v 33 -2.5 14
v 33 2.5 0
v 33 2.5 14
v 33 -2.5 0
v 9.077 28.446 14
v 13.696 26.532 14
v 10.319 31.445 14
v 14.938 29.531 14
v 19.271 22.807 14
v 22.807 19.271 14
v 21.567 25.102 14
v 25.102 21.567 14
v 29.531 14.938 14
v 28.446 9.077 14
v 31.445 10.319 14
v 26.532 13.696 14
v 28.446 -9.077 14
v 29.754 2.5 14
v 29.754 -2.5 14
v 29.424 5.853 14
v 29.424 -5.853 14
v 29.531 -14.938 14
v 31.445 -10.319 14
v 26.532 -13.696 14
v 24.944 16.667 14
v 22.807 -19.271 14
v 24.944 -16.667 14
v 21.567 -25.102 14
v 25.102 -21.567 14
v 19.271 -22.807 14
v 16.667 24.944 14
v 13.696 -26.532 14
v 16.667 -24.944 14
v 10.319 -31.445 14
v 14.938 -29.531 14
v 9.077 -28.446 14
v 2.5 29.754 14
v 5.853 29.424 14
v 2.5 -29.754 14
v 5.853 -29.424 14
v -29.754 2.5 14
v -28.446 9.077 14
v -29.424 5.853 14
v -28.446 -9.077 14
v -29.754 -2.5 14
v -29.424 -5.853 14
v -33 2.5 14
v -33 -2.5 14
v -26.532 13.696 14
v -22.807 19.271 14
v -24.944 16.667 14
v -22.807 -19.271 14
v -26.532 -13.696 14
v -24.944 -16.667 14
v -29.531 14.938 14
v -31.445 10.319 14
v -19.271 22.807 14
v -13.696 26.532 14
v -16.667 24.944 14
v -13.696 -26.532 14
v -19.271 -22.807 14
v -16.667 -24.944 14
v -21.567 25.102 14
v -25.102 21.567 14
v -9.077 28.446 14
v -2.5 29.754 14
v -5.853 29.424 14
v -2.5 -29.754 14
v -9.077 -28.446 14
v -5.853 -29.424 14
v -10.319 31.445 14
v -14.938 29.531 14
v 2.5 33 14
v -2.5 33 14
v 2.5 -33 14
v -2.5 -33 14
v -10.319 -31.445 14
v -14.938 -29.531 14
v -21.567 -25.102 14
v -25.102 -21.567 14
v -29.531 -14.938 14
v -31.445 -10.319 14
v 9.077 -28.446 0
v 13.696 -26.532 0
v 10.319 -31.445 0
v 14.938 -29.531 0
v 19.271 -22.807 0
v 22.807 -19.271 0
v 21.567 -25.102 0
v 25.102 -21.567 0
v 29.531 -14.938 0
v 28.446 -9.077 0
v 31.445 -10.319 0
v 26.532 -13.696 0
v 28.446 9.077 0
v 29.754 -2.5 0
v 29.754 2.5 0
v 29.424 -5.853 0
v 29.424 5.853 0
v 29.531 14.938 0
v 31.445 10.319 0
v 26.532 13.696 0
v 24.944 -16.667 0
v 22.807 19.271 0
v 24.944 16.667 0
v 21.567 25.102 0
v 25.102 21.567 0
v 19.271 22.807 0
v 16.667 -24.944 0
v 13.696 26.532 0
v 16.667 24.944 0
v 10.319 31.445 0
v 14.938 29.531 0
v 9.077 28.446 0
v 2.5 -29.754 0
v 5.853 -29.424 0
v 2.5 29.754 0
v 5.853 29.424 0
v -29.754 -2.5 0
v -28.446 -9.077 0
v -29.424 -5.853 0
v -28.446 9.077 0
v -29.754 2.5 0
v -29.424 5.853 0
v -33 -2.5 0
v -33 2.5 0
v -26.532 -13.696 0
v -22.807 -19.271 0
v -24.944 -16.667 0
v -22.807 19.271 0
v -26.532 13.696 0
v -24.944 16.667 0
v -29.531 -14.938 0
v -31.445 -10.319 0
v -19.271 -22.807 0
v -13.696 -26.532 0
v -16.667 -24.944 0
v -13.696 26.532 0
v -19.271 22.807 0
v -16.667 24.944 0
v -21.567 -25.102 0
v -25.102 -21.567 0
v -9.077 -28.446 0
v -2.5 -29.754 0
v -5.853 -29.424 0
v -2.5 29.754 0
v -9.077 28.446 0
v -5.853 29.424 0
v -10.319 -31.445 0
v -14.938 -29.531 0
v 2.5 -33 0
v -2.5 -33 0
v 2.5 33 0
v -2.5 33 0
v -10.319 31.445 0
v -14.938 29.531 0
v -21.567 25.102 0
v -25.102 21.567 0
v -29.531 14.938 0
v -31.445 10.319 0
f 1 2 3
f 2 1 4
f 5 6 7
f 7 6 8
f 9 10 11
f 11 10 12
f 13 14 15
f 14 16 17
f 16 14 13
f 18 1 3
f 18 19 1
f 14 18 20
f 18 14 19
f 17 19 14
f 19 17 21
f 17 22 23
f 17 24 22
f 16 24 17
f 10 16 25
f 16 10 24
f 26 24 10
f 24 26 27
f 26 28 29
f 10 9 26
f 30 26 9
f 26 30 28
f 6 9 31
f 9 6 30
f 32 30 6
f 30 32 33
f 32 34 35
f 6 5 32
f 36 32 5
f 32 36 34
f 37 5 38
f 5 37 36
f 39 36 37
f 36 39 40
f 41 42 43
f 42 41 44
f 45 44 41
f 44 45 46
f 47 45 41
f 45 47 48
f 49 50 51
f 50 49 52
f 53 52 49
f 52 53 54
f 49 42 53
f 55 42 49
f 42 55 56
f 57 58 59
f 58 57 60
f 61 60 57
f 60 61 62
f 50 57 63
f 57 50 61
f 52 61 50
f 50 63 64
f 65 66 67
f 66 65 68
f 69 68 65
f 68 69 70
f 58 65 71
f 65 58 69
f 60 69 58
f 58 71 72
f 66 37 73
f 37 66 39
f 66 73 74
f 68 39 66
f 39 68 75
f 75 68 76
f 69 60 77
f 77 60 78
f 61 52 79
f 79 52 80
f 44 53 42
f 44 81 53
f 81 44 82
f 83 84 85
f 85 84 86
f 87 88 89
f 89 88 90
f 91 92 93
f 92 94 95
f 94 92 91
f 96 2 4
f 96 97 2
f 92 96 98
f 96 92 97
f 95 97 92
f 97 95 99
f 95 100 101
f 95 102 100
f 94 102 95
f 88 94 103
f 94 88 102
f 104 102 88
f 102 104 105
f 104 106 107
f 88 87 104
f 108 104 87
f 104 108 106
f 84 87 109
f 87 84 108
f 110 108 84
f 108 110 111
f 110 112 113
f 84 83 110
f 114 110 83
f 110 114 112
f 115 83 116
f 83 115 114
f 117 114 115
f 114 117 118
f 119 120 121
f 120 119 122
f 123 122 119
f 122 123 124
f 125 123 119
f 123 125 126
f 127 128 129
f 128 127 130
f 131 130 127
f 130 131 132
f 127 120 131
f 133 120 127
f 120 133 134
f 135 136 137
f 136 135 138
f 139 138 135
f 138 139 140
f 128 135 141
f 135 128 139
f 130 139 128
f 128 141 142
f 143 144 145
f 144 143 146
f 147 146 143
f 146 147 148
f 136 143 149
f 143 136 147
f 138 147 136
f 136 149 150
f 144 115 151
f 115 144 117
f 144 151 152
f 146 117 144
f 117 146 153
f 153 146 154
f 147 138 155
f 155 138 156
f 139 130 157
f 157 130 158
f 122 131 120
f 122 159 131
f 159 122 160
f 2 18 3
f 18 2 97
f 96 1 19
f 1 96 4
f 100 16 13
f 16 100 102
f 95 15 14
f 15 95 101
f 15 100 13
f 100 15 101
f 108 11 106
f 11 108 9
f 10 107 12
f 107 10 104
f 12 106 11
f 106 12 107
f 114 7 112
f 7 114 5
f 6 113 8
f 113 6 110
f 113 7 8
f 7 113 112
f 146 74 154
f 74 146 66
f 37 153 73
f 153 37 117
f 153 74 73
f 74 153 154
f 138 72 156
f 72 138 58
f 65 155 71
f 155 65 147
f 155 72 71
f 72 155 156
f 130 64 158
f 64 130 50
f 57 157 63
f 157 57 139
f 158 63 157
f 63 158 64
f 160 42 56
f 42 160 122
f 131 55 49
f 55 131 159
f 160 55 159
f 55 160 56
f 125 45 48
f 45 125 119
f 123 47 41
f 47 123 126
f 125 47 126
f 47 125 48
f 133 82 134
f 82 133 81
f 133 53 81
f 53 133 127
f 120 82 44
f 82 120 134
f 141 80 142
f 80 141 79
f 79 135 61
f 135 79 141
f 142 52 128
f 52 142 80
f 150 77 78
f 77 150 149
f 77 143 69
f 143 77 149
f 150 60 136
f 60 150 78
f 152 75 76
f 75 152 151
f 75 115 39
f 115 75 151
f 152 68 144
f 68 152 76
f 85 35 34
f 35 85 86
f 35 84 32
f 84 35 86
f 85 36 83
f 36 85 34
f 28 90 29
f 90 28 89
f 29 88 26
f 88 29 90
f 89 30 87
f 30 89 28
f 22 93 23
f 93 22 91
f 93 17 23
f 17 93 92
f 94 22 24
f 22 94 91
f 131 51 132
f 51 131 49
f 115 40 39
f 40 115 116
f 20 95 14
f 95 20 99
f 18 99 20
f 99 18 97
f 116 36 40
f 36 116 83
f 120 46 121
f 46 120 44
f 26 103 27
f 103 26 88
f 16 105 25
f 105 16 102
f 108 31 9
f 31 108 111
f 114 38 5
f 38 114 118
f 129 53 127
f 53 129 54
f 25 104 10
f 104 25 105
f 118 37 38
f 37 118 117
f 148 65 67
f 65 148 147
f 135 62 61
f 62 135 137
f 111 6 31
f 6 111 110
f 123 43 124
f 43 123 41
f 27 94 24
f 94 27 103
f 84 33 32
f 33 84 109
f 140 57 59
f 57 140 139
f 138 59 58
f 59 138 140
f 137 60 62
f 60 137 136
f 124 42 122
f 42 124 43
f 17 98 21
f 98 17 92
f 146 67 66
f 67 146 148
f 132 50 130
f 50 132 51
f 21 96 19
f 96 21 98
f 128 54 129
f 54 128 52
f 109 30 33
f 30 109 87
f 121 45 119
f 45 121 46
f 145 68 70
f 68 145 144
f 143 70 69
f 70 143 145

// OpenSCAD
$fn = 32;

// ----------------------------------------------------------------------
// Spur blank: plain gear blank
// ----------------------------------------------------------------------

// --- parameters (mm) ---
disc_r = 30;              // blank root radius
disc_t = 14;              // blank thickness
n_teeth = 16;             // stub tooth count
tooth_w = 5;              // tooth width at the root
tooth_h = 3;              // tooth height above the root

out_r = disc_r + tooth_h;  // tip radius
bbox_x = 66.0;  // measured width over the teeth
bbox_y = 66.0;  // measured depth over the teeth

union() {
  cylinder(r = disc_r, h = disc_t);
  for (i = [0 : n_teeth - 1])
    rotate([0, 0, i * 360 / n_teeth])
      translate([disc_r - 1, -tooth_w / 2, 0])
        cube([tooth_h + 1, tooth_w, disc_t]);
}
